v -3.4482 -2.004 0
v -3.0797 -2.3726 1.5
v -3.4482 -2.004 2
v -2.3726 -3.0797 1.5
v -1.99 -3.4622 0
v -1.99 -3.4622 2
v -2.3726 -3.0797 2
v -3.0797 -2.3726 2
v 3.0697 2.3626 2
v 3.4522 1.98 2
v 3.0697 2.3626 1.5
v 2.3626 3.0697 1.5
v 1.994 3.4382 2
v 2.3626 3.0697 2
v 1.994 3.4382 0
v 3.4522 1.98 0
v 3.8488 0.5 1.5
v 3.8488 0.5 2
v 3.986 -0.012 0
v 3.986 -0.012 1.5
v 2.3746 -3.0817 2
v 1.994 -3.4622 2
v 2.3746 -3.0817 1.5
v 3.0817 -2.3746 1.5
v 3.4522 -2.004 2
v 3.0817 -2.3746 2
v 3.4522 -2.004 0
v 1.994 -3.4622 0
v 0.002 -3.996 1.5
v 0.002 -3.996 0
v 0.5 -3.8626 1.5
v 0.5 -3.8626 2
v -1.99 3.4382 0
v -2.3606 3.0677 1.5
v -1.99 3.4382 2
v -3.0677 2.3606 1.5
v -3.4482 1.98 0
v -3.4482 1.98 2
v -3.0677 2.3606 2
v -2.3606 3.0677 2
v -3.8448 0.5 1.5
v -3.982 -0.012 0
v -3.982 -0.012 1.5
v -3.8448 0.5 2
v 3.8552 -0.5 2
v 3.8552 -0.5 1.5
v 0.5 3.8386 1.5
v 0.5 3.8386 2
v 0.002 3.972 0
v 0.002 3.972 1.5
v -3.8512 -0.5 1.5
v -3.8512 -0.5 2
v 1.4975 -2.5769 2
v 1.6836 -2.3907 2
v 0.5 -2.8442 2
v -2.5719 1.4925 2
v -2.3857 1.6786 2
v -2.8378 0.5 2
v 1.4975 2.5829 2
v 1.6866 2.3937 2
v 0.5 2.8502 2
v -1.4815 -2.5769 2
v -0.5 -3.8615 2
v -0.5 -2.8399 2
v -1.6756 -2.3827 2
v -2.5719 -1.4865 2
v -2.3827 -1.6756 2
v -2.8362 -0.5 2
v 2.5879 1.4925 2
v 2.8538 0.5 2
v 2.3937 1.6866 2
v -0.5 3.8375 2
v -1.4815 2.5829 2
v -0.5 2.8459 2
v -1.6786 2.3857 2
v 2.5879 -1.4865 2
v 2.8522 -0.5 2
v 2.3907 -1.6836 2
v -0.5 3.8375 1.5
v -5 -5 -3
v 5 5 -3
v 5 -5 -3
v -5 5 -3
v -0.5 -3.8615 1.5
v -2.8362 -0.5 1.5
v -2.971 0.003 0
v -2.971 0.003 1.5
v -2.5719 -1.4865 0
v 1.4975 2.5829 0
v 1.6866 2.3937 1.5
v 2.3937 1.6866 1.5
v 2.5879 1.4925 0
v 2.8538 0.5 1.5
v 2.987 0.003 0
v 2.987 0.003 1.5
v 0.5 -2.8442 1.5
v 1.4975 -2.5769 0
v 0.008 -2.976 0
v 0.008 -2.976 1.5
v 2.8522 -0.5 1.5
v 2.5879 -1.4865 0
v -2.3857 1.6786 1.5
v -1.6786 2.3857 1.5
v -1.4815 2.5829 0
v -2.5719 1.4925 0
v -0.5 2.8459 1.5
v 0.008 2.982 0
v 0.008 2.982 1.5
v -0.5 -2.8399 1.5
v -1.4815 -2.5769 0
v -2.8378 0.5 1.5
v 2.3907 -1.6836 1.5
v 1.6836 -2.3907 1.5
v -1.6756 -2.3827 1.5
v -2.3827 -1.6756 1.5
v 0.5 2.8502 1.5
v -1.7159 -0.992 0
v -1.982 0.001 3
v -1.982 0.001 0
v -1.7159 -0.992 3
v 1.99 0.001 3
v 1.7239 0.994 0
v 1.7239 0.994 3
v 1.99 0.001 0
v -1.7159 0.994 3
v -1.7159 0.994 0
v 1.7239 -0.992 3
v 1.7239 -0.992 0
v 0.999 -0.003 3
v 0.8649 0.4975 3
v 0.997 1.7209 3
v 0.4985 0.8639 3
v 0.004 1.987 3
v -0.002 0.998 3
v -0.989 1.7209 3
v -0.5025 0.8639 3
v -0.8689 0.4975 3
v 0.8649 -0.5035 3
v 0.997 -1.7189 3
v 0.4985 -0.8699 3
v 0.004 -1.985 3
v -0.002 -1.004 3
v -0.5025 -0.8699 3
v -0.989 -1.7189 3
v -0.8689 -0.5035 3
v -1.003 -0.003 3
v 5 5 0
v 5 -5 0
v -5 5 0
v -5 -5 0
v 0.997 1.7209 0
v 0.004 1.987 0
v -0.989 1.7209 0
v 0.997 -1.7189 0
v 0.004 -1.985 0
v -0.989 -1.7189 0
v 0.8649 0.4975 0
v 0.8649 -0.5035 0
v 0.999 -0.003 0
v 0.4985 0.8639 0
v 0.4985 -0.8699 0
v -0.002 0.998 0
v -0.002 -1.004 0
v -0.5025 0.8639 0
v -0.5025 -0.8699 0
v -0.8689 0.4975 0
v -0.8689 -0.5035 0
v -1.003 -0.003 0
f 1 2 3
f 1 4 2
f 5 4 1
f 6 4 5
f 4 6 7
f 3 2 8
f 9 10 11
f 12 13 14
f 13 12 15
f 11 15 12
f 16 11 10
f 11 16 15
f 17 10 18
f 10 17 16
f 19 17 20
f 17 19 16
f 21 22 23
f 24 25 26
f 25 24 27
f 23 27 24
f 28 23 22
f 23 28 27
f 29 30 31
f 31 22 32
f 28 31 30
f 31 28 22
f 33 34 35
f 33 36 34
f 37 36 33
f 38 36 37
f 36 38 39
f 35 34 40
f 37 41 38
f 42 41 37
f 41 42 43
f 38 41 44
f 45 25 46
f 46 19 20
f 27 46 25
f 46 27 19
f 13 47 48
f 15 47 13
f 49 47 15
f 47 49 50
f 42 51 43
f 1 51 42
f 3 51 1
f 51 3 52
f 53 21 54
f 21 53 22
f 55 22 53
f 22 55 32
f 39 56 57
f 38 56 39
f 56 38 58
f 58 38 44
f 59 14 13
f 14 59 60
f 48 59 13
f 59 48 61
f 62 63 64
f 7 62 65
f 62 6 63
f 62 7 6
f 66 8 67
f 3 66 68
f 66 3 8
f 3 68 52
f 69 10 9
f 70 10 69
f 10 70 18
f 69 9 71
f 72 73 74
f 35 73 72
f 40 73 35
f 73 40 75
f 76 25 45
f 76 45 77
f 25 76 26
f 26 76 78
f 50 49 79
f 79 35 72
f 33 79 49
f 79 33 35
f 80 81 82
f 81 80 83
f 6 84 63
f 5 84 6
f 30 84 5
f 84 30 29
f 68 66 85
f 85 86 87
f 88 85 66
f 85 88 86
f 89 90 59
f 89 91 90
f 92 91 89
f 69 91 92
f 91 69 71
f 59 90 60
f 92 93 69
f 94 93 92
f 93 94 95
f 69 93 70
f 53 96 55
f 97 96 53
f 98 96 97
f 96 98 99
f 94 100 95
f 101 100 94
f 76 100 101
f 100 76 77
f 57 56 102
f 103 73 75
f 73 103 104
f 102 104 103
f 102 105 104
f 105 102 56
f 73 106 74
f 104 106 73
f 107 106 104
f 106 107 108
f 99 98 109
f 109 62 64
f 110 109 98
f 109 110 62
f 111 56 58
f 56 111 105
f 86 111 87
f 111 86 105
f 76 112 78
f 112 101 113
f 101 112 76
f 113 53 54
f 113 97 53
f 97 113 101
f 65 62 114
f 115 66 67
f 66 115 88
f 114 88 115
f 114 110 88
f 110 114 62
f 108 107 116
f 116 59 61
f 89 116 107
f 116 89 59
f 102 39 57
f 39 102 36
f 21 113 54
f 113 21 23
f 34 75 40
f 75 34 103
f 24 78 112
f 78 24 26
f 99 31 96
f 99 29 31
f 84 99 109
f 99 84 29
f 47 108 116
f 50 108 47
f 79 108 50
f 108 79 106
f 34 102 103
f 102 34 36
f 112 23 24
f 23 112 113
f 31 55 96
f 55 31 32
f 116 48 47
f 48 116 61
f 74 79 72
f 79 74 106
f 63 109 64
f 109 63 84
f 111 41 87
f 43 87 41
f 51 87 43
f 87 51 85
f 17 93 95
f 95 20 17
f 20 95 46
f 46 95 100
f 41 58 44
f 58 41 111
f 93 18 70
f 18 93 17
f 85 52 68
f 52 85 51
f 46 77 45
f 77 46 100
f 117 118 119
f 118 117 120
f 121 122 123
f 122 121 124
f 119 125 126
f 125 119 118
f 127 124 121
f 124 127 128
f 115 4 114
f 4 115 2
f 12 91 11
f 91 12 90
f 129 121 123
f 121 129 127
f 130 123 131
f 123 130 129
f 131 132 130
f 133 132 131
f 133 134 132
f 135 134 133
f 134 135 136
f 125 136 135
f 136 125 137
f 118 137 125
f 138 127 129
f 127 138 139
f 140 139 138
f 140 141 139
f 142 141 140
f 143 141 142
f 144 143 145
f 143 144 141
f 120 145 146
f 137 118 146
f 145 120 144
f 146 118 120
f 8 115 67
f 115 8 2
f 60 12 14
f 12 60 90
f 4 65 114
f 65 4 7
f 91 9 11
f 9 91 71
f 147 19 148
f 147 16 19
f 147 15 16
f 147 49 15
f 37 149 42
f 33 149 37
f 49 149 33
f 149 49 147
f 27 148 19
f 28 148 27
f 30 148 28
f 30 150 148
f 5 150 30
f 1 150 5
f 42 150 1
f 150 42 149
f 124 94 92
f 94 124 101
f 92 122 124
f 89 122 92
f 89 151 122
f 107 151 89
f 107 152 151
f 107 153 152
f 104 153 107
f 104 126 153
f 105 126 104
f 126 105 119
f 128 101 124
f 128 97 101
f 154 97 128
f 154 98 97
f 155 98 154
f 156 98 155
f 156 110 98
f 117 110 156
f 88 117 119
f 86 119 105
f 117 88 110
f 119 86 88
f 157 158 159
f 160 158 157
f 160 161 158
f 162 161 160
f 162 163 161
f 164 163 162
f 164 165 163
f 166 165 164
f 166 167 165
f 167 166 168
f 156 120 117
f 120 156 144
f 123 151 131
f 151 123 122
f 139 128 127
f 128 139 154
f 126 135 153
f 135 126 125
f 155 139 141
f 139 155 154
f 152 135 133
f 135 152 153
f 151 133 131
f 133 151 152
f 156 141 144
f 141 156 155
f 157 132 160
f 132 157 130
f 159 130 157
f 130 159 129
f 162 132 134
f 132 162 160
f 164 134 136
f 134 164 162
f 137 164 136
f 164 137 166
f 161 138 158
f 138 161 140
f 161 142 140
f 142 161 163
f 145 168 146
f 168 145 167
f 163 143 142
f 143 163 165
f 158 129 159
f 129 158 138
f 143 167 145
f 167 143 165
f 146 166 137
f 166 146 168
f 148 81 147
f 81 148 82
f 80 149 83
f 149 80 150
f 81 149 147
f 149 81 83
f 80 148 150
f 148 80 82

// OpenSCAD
intersection() {
translate([-6, -6, -3.6]) cube(size = [12, 12, 7.2], center = false);
union() {
translate([-5, -5, -3]) cube(size = [10, 10, 3], center = false);
difference() {
difference() {
union() {
translate([0.002, -0.012, -3])
cylinder(h = 5, r1 = 3.984, r2 = 3.984, center = false, $fn = 12);
translate([0.008, 0.003, 1.5])
cylinder(h = 16.6, r1 = 2.979, r2 = 2.979, center = false, $fn = 12);
}
difference() {
union() {
rotate([180, 0, 45])
translate([-0.5, -18.1, -18.1]) cube(size = [1, 36.2, 16.6], center = false);
translate([-0.5, -5, 1.5]) cube(size = [1, 10, 0.5], center = false);
}
translate([0.008, 0.003, 1.5])
cylinder(h = 16.6, r1 = 2.979, r2 = 2.979, center = false, $fn = 12);
}
}
union() {
difference() {
translate([-5, -0.5, 1.5]) cube(size = [23.1, 1, 0.5], center = false);
translate([0.004, 0.001, 1.5])
cylinder(h = 0.5, r1 = 1.986, r2 = 1.986, center = false, $fn = 12);
}
difference() {
union() {
rotate([180, 0, 45])
translate([-18.1, -0.5, -3]) cube(size = [36.2, 1, 1.5], center = false);
translate([0.008, 0.003, 0])
cylinder(h = 3, r1 = 2.979, r2 = 2.979, center = false, $fn = 12);
}
difference() {
translate([0.004, 0.001, -18.1])
cylinder(h = 21.1, r1 = 1.986, r2 = 1.986, center = false, $fn = 12);
translate([-0.002, -0.003, 0])
cylinder(h = 18.1, r1 = 1.001, r2 = 1.001, center = false, $fn = 12);
}
}
translate([0.008, 0.003, 3])
cylinder(h = 15.1, r1 = 2.979, r2 = 2.979, center = false, $fn = 12);
}
}
}
}
